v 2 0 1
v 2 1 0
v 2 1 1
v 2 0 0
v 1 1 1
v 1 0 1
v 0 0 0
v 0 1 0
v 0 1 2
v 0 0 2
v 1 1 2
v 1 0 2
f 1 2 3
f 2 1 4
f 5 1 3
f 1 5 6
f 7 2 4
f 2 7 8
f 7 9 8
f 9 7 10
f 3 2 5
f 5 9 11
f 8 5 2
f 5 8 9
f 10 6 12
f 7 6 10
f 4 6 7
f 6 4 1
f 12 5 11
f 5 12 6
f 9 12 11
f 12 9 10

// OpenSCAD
module LBracket( d, l1=1,w1=1,l2=false,w2=false, center=false ) {
    union() {
        l2 = l2 == false ? l1 : l2;
        w2 = w2 == false ? w1 : w2;
        trans = center ? [ l1/2 - .5, 0, l2/2 ] : [ 0, 0, 0 ] ;
        
        cube( [l1,d,w1 ], center=center );
        translate( trans )
        cube( [w2,d,l2 ], center=center );
    }
}

LBracket( 1, l1=2, center=false );
